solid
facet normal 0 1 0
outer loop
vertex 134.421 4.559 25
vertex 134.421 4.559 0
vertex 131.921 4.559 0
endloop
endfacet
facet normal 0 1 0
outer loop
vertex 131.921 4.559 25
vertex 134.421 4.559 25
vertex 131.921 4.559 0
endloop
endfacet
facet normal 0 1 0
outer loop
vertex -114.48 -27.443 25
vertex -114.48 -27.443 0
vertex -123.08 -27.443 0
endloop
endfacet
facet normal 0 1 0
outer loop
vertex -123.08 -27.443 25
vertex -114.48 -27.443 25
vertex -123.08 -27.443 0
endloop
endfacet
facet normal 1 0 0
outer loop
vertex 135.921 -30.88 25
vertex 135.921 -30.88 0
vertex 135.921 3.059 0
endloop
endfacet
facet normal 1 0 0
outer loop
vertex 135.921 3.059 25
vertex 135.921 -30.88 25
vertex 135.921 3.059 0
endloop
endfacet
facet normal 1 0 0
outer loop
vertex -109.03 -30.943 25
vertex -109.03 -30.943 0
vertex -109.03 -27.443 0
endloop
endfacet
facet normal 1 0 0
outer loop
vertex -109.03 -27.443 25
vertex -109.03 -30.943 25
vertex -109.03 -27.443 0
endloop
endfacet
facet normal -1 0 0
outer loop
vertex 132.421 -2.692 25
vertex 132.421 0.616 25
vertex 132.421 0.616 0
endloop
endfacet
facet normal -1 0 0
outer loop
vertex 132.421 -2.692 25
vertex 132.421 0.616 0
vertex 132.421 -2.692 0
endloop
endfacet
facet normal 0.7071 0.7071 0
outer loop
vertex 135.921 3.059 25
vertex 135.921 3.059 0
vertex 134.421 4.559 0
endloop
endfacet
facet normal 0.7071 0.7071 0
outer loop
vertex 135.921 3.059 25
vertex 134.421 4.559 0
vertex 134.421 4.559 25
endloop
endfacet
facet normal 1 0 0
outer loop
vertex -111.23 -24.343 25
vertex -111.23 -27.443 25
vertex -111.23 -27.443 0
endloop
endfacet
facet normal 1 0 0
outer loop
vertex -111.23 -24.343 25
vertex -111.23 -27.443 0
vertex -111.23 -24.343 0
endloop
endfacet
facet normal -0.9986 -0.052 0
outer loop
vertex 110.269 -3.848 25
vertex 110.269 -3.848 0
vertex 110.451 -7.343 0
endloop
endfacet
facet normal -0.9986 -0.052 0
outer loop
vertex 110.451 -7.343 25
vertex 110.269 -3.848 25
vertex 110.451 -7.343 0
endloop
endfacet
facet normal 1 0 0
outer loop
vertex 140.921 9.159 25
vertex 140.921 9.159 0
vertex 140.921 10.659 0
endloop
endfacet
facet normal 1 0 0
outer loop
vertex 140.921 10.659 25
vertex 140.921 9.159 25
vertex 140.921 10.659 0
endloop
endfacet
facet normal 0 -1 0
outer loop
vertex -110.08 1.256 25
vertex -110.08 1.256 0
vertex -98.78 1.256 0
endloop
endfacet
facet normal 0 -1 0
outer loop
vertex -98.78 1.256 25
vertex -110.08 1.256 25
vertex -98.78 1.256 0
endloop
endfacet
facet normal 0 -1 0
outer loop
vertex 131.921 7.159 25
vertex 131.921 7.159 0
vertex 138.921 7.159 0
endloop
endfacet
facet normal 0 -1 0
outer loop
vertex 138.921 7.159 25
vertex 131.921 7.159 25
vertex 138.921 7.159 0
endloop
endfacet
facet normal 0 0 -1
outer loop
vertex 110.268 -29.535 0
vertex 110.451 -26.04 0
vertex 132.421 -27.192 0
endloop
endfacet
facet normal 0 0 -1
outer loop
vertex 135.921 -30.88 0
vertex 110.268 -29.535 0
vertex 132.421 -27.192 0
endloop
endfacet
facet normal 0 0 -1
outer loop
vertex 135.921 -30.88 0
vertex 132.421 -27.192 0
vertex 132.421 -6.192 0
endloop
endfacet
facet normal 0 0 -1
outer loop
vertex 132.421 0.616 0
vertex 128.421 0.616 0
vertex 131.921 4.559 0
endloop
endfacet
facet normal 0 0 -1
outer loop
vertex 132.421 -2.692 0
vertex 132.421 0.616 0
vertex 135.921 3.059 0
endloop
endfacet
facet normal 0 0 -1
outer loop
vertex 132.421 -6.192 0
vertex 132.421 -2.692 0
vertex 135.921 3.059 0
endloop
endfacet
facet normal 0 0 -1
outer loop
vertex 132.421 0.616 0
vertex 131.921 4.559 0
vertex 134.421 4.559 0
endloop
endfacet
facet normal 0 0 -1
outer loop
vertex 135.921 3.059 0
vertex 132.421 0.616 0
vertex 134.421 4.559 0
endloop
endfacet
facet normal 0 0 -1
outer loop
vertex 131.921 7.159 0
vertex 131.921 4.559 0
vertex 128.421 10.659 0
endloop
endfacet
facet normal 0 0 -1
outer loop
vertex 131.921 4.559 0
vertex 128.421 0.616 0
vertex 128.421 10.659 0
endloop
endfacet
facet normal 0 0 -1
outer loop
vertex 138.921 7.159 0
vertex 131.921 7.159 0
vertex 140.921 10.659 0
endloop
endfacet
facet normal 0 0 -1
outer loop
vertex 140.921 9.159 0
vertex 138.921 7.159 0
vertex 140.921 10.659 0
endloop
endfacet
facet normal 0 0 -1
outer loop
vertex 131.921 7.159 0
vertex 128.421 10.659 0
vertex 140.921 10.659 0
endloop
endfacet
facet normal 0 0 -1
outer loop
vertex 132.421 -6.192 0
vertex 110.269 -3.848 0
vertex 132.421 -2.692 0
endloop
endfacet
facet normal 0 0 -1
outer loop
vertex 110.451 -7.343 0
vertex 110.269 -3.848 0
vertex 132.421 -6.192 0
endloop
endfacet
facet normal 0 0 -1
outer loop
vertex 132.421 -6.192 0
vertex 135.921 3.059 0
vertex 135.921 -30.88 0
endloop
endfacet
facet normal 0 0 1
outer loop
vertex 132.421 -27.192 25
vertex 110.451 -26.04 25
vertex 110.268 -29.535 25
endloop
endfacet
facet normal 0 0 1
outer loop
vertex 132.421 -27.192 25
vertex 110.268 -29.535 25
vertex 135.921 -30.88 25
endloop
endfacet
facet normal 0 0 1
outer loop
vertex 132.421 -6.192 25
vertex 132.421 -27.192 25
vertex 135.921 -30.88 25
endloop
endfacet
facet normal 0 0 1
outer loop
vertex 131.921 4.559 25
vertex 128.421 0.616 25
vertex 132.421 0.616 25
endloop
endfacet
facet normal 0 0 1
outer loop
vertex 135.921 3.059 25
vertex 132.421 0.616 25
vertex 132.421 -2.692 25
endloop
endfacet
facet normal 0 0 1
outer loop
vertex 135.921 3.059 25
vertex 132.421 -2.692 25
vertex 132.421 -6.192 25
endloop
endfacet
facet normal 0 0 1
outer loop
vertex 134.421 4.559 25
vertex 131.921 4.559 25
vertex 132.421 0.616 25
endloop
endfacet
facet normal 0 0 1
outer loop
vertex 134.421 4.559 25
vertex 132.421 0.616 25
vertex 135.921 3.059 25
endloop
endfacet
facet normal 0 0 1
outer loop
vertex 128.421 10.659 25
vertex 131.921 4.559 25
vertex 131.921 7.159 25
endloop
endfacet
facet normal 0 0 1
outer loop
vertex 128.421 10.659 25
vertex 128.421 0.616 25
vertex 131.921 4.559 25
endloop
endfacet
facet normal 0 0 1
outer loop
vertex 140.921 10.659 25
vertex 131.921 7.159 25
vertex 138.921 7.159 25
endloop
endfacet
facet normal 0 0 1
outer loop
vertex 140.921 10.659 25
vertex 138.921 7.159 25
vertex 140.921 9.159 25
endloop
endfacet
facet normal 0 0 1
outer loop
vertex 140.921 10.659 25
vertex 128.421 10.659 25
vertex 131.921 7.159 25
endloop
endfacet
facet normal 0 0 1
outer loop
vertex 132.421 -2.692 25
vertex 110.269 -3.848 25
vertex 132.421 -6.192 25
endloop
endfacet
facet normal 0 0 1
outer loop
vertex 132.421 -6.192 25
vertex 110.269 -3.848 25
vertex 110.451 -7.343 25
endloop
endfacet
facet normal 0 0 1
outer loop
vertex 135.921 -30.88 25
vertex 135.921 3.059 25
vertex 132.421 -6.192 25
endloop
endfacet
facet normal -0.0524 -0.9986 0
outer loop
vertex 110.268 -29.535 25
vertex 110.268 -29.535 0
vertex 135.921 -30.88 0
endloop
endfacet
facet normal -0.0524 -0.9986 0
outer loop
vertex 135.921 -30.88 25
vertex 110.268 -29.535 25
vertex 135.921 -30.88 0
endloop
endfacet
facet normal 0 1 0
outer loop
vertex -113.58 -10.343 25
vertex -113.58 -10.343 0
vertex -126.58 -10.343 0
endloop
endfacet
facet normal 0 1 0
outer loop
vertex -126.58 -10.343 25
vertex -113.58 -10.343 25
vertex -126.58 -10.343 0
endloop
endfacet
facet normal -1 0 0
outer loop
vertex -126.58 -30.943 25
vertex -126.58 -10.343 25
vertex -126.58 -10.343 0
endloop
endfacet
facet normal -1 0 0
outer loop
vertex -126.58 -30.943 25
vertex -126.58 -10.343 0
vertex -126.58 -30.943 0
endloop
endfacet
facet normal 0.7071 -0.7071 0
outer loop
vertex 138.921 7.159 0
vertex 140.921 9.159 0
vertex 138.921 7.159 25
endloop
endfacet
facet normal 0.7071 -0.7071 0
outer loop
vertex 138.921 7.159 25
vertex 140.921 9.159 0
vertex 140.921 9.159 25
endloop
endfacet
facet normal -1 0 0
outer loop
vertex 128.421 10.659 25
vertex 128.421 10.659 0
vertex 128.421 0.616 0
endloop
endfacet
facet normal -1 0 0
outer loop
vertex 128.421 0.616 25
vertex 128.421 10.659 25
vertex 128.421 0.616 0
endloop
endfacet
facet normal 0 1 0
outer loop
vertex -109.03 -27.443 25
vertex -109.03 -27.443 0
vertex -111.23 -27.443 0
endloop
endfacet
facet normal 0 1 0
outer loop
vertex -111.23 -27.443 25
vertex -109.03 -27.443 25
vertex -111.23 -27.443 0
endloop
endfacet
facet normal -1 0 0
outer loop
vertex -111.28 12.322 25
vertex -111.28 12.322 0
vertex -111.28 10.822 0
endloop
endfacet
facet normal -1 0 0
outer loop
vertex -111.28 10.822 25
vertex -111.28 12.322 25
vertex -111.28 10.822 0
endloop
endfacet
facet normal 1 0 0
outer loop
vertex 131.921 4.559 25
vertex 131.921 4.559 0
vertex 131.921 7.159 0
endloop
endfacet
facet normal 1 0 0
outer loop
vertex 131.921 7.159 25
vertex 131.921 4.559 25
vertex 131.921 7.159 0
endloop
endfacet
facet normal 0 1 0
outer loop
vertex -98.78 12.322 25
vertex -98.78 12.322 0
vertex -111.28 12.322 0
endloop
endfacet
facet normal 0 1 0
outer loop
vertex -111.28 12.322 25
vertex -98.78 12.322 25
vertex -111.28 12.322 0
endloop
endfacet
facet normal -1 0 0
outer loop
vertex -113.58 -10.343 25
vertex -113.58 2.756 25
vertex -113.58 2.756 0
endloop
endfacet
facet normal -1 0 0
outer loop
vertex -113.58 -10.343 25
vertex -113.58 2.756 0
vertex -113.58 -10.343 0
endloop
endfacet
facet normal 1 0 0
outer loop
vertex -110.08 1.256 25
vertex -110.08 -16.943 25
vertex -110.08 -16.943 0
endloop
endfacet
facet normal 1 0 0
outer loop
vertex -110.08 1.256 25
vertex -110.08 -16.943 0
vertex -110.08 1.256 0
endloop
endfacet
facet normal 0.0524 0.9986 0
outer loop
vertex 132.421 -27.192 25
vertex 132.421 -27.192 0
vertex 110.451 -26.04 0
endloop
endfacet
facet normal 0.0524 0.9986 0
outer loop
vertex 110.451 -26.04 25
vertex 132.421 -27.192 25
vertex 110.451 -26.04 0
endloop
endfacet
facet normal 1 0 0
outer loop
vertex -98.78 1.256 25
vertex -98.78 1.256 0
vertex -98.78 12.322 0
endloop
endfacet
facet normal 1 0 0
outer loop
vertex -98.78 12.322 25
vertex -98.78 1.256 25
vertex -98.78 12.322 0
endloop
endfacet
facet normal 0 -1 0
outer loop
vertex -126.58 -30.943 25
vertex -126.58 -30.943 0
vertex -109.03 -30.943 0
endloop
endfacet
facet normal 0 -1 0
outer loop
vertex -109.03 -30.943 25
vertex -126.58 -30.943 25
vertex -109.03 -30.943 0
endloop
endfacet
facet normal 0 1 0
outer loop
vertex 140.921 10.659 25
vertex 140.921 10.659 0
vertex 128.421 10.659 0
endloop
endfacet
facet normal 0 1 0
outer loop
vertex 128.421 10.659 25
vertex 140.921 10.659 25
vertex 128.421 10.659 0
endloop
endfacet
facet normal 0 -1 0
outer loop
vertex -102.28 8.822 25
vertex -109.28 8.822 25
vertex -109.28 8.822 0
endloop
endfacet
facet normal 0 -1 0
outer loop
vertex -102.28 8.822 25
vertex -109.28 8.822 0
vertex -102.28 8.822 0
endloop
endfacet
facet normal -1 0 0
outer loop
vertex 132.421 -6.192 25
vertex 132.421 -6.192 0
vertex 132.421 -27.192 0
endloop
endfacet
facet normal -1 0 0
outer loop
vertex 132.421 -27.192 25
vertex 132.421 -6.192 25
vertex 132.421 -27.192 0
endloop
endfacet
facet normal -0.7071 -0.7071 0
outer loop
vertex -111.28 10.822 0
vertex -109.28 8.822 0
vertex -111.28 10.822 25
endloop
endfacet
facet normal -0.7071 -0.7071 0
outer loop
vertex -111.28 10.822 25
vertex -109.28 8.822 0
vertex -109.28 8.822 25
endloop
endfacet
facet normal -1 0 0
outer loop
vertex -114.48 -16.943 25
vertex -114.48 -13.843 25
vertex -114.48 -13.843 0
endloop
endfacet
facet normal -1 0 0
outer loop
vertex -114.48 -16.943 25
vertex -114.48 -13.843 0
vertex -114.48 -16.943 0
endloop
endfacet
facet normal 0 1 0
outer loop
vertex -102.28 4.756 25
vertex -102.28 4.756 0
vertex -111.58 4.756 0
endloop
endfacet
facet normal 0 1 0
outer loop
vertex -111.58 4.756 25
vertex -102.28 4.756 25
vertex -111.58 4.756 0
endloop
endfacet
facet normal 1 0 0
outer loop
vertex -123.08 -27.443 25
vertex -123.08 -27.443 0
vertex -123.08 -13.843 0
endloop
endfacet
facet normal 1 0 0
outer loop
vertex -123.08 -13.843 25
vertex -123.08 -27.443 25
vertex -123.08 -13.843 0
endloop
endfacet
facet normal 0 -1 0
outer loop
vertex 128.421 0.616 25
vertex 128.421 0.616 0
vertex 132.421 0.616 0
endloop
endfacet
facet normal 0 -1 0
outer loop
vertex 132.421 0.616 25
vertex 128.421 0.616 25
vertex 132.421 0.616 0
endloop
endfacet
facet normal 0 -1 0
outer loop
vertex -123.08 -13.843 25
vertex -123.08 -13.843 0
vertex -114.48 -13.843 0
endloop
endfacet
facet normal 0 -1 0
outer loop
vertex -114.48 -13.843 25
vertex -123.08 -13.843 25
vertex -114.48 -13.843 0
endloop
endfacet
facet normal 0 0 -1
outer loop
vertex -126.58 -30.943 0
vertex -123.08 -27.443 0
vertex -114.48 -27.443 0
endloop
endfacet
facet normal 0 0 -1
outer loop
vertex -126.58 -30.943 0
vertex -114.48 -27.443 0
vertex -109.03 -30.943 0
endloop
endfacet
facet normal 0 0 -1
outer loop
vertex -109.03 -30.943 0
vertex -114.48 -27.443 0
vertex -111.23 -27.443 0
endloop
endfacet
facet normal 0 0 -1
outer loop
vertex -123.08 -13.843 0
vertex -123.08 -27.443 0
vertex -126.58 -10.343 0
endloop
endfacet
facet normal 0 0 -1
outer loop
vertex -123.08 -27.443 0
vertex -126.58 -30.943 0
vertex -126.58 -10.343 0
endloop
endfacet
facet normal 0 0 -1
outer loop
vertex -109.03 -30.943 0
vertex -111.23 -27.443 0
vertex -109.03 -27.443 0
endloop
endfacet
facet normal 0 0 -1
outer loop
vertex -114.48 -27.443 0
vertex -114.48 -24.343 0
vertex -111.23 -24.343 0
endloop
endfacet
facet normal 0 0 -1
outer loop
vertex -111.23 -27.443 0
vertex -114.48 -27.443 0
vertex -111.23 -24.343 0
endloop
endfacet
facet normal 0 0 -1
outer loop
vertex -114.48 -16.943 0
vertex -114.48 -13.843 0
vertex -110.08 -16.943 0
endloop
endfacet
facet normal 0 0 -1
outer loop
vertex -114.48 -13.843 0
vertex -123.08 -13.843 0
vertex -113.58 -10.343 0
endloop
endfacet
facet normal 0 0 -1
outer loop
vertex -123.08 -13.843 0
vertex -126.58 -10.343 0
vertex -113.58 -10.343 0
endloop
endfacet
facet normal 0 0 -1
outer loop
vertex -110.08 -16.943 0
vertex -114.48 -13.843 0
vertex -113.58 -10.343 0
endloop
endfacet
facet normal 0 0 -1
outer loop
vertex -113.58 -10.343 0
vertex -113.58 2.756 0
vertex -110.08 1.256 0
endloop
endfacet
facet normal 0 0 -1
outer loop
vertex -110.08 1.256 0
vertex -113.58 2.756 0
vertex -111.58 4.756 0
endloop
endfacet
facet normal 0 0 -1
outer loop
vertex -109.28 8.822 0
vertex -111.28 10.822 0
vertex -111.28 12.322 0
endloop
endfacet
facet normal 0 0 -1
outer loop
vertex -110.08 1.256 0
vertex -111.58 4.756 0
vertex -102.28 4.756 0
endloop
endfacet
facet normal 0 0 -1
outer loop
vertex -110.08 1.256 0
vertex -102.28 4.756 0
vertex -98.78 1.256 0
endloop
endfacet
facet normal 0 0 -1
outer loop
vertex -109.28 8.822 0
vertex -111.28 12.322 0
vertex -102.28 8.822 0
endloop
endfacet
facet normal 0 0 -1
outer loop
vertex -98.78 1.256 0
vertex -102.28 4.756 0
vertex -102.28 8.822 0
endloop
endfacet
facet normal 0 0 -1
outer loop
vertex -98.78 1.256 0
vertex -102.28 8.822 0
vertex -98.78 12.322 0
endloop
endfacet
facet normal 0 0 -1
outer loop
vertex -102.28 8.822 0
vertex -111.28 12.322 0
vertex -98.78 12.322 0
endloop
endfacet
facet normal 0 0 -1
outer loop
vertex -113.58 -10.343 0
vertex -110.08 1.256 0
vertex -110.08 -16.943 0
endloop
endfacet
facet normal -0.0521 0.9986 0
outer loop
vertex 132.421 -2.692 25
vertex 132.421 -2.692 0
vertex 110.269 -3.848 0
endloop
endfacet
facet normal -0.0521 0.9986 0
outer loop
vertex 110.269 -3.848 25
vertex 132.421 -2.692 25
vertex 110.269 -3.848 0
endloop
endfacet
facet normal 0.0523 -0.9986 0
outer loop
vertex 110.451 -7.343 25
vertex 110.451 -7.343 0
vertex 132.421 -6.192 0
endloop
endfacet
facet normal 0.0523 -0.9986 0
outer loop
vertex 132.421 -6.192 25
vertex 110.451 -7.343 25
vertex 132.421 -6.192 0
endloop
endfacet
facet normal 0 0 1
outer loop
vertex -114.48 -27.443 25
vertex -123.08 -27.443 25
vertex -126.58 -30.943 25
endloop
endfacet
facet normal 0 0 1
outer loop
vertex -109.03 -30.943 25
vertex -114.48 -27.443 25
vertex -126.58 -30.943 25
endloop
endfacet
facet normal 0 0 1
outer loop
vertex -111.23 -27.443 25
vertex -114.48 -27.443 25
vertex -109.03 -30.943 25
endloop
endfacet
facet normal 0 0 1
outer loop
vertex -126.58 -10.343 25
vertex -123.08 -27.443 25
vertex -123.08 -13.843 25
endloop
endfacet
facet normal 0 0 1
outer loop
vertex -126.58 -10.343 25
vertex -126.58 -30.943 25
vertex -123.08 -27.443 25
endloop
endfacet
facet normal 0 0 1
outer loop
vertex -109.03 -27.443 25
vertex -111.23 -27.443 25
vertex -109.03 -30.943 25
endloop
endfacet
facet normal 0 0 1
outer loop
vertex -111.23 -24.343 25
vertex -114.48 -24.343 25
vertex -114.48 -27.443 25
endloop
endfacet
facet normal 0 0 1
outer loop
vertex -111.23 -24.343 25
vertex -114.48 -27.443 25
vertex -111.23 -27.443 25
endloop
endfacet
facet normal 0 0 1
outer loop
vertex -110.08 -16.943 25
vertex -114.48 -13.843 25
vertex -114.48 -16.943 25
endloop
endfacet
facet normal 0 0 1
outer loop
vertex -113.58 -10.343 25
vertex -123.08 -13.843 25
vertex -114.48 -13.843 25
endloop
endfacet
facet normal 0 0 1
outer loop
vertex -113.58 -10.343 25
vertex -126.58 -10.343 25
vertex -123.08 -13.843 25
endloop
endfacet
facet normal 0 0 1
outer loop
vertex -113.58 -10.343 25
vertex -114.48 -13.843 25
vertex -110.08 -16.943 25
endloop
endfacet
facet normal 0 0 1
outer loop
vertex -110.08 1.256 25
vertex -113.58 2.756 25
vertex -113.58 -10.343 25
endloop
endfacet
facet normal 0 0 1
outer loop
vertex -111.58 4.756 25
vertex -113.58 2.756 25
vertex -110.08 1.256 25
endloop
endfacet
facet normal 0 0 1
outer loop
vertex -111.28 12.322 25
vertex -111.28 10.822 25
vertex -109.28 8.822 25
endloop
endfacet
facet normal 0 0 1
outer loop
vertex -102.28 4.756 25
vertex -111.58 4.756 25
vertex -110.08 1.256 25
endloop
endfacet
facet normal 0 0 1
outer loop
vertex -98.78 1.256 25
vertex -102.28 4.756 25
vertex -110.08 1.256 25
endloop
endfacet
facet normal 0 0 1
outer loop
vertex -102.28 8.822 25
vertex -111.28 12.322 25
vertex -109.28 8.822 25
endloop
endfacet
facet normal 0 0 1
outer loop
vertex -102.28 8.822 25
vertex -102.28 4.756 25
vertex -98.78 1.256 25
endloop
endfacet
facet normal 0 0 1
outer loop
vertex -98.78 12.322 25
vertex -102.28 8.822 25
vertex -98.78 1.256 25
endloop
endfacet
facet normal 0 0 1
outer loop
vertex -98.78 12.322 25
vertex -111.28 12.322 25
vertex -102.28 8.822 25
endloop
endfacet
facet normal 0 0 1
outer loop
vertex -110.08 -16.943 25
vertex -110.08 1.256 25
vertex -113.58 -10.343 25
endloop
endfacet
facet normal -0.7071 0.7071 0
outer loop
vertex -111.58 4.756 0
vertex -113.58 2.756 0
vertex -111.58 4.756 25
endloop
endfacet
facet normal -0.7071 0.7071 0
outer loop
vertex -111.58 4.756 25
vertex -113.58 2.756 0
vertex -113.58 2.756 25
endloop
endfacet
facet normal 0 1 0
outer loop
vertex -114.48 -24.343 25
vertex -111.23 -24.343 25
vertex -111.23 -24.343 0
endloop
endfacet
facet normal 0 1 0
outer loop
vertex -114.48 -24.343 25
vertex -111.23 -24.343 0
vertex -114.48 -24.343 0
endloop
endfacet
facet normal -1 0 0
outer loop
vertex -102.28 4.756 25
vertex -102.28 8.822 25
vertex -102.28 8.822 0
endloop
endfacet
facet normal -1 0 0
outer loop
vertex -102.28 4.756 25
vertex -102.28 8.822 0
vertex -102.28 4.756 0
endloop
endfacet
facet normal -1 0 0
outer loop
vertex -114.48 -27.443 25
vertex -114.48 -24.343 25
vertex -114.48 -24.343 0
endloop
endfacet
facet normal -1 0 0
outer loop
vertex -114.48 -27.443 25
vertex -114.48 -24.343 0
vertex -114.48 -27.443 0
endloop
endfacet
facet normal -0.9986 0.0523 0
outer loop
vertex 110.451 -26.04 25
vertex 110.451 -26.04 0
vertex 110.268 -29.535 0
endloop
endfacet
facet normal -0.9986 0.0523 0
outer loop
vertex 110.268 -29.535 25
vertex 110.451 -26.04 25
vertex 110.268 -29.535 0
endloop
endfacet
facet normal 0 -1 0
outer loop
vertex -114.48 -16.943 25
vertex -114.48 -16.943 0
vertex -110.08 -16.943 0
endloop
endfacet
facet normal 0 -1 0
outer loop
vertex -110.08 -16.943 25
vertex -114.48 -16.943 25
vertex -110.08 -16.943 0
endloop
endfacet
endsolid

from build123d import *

# Parameters (mm, degrees)
F1_DEPTH = 25
F2_SIZE  = 2
F3_SIZE  = 1.5


with BuildPart() as f1:
    # F0 (on Top) → F1 (new body)
    with BuildSketch(Plane.XY):
        Polygon((131.920939, 4.559022), (131.920939, 5.159022), (131.920939, 6.559022), (131.920939, 7.159022), (140.920939, 7.159022), (140.920939, 10.659022), (128.420939, 10.659022), (128.420939, 0.616223), (132.420939, 0.616223), (132.420939, -2.691577), (110.268669, -3.847726), (110.451089, -7.342968), (132.420939, -6.191577), (132.420939, -27.191577), (110.451089, -26.040186), (110.267914, -29.53539), (135.920939, -30.879808), (135.920939, 4.559022), align=None)
        Polygon((-114.480485, -16.942968), (-110.080485, -16.942968), (-110.080485, 1.2555), (-98.780485, 1.2555), (-98.780485, 12.321532), (-111.280485, 12.321532), (-111.280485, 8.821532), (-102.280485, 8.821532), (-102.280485, 4.7555), (-113.580485, 4.7555), (-113.580485, -10.342968), (-126.580485, -10.342968), (-126.580485, -30.942968), (-109.030485, -30.942968), (-109.030485, -27.442968), (-111.230485, -27.442968), (-111.230485, -24.342968), (-114.480485, -24.342968), (-114.480485, -27.442968), (-123.080485, -27.442968), (-123.080485, -13.842968), (-114.480485, -13.842968), align=None)
    extrude(amount=F1_DEPTH)

    # F2
    f2_edges = [f1.edges().sort_by_distance(p)[0] for p in [
        (140.920939, 7.159022, 12.5),
        (-111.280485, 8.821532, 12.5),
        (-113.580485, 4.7555, 12.5),
    ]]
    chamfer(f2_edges, length=F2_SIZE)

    # F3
    f3_edges = [f1.edges().sort_by_distance(p)[0] for p in [
        (135.920939, 4.559022, 12.5),
    ]]
    chamfer(f3_edges, length=F3_SIZE)


solid = f1.part
